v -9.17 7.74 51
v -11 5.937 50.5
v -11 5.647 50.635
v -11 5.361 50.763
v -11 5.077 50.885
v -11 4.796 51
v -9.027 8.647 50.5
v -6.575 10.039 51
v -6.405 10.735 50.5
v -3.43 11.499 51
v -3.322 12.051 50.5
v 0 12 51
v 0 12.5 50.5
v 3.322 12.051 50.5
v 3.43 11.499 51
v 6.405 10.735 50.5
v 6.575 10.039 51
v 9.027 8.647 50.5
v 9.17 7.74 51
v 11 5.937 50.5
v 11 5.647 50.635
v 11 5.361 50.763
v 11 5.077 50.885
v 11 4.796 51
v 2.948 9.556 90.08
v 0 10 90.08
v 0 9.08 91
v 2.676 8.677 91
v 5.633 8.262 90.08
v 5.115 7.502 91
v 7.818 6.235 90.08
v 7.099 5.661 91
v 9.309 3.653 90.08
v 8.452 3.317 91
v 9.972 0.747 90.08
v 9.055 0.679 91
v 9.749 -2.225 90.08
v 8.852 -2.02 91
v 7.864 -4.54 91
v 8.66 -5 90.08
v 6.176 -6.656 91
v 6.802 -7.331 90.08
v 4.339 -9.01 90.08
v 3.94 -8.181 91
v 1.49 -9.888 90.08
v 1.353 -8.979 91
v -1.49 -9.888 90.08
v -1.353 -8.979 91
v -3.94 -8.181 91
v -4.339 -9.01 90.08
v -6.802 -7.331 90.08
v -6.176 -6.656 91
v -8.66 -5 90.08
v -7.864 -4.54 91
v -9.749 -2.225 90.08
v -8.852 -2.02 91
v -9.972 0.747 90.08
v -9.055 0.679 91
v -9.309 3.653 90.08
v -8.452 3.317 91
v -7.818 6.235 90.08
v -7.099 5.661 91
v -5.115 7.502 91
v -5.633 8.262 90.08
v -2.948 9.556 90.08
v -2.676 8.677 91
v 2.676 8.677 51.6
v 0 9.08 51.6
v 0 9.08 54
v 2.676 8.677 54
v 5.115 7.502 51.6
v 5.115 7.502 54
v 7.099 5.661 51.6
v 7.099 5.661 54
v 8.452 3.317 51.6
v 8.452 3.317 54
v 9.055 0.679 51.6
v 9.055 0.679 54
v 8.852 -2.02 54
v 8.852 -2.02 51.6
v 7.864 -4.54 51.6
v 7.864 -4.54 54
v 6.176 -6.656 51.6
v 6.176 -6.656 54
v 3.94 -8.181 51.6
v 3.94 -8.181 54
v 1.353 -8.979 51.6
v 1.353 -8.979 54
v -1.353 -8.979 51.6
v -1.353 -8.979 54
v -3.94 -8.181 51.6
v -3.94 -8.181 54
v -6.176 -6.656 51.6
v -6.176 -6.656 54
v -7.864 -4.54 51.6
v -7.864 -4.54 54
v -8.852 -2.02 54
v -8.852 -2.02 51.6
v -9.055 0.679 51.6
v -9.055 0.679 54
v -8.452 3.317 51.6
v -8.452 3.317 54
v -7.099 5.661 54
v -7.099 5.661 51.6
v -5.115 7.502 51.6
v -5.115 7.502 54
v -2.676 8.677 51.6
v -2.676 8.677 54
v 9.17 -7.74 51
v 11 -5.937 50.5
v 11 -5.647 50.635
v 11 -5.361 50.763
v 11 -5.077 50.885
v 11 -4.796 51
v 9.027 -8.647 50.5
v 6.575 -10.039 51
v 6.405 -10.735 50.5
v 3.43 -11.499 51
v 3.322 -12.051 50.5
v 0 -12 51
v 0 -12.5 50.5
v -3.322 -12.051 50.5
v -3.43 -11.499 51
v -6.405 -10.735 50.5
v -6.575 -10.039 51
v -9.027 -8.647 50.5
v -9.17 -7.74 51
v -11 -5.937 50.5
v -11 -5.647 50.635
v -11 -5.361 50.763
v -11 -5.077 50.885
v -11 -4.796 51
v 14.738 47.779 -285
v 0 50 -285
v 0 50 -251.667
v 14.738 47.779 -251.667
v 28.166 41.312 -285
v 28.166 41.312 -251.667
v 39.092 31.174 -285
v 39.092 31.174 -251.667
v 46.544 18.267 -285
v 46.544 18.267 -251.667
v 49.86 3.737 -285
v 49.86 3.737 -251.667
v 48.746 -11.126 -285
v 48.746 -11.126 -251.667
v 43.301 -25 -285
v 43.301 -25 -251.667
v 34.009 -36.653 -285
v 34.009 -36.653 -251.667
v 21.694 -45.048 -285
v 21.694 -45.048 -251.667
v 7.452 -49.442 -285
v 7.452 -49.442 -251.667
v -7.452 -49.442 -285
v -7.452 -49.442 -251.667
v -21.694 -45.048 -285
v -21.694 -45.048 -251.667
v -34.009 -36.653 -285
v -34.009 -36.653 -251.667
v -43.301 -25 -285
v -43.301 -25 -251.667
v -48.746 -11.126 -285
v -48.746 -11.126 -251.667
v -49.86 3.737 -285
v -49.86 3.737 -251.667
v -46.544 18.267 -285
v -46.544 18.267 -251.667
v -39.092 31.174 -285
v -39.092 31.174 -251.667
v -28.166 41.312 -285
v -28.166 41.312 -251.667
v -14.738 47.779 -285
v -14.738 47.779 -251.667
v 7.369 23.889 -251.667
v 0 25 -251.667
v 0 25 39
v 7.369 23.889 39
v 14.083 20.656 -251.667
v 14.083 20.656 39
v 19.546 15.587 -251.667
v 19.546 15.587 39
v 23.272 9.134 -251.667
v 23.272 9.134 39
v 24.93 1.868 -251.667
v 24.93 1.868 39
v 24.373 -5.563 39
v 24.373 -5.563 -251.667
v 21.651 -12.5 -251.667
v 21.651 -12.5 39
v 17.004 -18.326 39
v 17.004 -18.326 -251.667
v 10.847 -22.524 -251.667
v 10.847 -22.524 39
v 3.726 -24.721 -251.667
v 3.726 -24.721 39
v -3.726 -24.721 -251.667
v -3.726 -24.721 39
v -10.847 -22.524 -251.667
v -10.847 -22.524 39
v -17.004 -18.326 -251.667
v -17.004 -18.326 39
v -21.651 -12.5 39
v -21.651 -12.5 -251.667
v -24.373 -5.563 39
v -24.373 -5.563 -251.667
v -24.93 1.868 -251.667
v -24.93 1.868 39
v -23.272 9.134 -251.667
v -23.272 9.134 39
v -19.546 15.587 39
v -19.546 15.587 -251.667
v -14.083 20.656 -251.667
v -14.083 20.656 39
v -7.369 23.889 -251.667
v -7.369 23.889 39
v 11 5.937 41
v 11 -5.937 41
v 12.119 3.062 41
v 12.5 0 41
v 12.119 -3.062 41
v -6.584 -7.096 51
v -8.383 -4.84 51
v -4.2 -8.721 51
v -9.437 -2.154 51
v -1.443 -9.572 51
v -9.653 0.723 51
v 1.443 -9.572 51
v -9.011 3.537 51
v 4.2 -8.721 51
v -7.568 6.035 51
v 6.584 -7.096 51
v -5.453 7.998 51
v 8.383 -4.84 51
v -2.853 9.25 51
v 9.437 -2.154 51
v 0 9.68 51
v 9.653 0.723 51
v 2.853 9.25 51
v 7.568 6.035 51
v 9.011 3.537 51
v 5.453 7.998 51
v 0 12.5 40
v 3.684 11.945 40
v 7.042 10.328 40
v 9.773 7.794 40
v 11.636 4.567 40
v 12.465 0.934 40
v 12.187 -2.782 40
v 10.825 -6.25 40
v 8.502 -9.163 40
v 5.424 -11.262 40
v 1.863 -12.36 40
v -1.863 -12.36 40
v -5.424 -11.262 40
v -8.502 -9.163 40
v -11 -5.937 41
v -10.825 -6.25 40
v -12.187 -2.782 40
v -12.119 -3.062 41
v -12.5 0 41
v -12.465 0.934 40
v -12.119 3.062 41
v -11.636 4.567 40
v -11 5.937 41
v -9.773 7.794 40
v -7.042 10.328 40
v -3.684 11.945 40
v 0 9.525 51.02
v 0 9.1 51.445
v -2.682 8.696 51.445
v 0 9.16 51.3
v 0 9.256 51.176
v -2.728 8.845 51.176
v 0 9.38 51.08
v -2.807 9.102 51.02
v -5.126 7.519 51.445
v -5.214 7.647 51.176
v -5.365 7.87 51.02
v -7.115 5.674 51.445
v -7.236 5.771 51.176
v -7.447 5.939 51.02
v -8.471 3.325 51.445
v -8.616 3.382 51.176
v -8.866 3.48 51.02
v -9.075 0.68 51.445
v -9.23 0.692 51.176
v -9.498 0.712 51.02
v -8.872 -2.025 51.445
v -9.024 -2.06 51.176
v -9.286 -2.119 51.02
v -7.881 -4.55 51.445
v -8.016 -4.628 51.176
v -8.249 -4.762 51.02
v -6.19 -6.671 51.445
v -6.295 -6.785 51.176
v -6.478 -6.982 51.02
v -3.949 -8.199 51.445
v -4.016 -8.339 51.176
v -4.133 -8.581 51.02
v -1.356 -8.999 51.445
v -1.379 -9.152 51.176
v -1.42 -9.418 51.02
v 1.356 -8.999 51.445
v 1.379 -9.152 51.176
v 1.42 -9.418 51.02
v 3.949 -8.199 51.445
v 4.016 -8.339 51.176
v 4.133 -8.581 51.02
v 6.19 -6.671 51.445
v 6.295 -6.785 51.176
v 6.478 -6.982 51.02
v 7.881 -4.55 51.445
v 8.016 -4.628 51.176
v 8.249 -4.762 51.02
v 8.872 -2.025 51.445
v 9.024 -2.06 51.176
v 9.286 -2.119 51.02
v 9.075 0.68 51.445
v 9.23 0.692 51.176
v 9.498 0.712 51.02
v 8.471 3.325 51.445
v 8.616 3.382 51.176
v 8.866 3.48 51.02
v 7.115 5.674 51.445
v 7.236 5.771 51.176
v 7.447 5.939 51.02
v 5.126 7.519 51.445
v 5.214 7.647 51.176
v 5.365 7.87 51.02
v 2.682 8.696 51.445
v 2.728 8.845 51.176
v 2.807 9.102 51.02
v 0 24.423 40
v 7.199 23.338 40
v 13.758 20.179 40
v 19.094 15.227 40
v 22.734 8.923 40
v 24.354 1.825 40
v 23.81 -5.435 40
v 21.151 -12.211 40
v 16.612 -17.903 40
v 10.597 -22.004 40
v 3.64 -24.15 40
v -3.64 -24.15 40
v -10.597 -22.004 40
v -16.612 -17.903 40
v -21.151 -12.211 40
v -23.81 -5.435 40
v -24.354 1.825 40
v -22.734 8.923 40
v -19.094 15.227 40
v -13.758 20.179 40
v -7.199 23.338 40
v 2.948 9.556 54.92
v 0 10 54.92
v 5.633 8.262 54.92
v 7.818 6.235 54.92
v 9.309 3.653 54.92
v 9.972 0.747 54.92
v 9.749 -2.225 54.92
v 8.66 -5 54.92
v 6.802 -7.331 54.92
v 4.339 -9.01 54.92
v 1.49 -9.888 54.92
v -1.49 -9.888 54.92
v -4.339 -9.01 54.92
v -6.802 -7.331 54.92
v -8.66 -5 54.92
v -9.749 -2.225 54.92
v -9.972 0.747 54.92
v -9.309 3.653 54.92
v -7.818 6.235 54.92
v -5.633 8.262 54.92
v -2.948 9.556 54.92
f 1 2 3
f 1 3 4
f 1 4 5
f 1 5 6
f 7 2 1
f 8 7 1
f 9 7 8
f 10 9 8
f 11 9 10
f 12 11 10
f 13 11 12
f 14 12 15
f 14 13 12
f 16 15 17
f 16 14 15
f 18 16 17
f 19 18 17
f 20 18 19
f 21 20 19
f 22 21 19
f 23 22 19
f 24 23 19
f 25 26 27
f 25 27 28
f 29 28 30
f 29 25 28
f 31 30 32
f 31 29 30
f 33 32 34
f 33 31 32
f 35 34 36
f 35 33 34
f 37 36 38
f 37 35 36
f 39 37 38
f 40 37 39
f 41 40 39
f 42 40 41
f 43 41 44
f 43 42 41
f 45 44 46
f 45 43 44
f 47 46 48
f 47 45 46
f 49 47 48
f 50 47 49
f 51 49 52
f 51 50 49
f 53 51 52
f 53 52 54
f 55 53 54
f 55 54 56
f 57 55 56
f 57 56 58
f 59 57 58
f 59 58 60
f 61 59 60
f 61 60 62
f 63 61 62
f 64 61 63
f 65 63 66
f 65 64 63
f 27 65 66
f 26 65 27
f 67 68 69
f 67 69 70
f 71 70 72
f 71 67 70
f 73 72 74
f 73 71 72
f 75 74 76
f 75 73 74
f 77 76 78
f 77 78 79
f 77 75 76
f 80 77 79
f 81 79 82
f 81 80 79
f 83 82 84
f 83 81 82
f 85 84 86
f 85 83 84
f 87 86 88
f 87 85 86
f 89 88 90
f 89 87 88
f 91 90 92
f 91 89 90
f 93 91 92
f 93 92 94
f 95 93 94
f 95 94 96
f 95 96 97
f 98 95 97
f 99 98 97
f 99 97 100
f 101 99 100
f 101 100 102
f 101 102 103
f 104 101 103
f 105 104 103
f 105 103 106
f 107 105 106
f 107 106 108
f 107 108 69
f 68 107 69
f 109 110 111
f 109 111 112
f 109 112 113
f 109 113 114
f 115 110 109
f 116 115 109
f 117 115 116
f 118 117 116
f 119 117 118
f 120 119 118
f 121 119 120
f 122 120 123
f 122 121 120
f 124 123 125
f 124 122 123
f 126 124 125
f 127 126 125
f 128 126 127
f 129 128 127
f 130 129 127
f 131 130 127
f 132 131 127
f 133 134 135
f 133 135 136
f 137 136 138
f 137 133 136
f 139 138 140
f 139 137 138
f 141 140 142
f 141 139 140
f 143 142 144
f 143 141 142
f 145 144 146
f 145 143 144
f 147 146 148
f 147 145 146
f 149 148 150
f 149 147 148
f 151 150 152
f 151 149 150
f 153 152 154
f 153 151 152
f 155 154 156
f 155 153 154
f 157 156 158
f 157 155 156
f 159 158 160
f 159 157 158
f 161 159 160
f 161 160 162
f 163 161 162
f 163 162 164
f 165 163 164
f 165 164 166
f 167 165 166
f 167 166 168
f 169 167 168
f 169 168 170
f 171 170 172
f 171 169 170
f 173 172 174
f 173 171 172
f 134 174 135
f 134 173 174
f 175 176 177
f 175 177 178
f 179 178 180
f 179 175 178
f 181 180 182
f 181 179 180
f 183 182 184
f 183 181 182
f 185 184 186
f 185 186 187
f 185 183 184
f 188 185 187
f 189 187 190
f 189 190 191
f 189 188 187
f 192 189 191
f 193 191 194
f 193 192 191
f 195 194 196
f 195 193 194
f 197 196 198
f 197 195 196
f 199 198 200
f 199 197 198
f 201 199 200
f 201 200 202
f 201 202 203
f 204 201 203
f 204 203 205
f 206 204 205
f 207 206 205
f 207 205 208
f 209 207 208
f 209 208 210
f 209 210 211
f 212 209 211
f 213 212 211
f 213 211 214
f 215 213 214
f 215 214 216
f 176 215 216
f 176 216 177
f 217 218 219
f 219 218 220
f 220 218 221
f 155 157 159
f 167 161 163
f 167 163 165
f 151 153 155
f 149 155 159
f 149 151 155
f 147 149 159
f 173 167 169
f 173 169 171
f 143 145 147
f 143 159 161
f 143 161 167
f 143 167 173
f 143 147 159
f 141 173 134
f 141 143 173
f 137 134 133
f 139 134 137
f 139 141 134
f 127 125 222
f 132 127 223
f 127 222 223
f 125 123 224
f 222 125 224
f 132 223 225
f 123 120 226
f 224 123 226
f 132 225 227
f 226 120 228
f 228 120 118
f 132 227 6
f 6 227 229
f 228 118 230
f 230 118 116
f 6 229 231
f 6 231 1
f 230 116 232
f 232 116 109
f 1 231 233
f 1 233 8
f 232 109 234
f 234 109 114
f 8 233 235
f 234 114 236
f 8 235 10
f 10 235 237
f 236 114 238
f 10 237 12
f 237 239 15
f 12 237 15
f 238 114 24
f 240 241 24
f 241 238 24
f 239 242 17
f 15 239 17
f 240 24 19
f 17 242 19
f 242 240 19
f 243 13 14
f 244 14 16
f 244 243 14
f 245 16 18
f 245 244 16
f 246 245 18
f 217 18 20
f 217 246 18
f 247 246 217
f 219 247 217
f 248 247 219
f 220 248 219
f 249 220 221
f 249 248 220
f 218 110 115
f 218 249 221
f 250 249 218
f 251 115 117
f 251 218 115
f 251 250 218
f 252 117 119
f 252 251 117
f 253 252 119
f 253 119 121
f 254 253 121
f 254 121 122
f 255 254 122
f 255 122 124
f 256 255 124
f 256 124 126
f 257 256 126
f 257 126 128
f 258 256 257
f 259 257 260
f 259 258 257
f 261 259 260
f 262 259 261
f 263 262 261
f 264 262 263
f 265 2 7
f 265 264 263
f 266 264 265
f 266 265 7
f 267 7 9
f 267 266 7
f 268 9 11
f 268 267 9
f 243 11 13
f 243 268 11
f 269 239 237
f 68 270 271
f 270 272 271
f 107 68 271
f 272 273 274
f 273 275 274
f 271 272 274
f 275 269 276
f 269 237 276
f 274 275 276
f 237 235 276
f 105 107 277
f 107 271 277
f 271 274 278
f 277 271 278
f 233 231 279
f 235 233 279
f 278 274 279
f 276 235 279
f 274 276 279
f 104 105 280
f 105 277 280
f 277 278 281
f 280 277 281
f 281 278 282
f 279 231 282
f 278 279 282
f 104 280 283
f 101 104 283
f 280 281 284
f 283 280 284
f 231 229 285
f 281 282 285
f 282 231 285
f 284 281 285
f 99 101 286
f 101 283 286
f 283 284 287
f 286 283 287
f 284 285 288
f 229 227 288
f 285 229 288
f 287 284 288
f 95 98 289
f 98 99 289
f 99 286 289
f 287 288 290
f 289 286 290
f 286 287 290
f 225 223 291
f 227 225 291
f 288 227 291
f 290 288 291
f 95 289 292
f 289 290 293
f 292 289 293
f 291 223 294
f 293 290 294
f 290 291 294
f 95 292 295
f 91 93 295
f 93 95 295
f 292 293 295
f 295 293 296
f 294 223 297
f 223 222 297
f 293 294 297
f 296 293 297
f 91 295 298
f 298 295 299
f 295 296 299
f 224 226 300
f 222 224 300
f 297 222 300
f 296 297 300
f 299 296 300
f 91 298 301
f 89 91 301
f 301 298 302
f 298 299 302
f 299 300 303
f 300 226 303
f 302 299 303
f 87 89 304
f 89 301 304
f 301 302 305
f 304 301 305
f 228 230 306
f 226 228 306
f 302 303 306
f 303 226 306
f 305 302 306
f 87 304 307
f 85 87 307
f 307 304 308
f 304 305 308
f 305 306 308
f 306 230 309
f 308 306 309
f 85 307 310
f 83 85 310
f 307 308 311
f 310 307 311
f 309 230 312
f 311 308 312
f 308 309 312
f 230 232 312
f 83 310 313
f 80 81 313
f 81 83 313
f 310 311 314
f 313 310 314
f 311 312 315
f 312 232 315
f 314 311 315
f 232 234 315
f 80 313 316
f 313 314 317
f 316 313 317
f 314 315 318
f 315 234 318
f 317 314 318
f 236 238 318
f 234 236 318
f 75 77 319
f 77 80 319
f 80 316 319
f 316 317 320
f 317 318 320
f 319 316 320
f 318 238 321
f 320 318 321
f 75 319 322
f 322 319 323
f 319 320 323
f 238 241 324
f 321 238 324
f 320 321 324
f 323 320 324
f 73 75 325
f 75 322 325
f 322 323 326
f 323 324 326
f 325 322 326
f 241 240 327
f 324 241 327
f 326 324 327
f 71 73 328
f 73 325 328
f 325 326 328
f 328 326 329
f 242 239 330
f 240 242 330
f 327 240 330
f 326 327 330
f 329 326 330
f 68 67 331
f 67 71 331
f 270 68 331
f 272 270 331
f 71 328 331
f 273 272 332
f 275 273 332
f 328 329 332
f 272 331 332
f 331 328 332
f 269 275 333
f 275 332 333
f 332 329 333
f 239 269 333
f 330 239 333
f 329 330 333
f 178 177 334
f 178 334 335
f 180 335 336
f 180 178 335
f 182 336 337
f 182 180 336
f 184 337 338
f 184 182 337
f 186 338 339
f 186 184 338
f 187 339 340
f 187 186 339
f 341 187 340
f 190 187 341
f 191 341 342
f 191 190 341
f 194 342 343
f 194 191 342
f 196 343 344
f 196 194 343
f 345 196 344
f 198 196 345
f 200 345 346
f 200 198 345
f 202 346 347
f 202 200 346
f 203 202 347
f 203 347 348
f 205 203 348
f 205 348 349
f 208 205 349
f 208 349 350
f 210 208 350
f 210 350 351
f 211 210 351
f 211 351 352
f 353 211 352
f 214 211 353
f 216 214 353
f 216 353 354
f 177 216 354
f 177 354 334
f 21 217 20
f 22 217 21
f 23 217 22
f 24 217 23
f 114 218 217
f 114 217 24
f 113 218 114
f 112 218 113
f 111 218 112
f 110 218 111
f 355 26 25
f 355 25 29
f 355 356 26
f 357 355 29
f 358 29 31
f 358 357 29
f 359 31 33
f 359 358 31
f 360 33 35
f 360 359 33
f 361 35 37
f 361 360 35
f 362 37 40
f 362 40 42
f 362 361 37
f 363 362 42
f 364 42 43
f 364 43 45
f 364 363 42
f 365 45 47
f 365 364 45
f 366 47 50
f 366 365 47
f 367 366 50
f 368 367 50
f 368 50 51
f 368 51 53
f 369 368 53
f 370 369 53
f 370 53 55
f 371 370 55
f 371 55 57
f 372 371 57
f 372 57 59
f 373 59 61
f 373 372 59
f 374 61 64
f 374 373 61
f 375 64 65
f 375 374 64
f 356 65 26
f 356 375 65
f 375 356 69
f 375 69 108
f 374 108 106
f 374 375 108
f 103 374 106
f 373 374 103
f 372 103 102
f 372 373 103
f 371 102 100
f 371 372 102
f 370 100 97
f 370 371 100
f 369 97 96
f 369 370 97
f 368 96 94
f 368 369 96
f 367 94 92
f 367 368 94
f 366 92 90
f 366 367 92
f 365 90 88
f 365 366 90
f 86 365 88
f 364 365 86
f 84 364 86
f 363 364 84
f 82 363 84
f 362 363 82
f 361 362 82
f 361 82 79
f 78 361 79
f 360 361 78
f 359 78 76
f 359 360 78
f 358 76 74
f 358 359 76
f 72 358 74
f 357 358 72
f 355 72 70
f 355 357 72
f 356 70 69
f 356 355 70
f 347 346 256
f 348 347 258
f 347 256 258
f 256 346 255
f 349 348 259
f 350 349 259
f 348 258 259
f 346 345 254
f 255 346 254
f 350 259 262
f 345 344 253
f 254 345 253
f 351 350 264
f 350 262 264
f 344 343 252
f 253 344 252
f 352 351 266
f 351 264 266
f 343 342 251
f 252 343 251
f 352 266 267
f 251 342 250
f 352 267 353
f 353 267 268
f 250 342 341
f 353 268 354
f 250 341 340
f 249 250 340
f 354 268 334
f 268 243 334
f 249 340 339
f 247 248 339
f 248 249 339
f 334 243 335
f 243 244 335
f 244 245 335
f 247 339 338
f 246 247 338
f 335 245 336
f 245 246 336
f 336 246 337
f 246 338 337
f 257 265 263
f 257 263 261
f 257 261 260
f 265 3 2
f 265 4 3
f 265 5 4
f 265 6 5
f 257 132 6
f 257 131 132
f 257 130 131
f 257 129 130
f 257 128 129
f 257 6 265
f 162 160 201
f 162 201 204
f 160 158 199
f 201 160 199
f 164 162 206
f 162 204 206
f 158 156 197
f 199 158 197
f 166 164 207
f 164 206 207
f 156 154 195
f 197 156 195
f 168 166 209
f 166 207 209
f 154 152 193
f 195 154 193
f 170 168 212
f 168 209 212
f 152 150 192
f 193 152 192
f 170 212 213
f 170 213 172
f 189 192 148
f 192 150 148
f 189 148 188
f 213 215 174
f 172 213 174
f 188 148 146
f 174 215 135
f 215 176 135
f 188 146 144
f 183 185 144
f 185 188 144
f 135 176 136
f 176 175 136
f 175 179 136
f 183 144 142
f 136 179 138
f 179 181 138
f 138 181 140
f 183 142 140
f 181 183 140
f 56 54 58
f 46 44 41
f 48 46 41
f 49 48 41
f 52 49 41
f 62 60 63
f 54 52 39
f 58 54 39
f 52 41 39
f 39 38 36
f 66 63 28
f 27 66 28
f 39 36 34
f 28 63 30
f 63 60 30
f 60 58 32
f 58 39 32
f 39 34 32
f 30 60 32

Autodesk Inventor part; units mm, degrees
sketch "Sketch_1" plane through (0, 0, 0) normal (1, 0, 0) x (0, 1, 0)
  line L0 (0, -285) -> (0, 51)
  line L1 (0, 51) -> (12, 51)
  line L2 (12, 51) -> (12.5, 50.5)
  line L3 (12.5, 50.5) -> (12.5, 40)
  line L4 (12.5, 40) -> (24.4226, 40)
  line L5 (24.4226, 40) -> (25, 39)
  line L6 (25, 39) -> (25, -251.6667)
  line L7 (25, -251.6667) -> (50, -251.6667)
  line L8 (50, -251.6667) -> (50, -285)
  line L9 (50, -285) -> (0, -285)
  line L10 (0, -285) -> (0, 51)
revolve "Revolution1" add sketch "Sketch_1" angle 360 about axis through (0, 0, -285) along (0, 0, -1)
sketch "Sketch_3" plane through (0, 0, 0) normal (0, 1, 0) x (-1, 0, 0)
  line L0 (14, 41) -> (14, 54)
  line L1 (14, 54) -> (-14, 54)
  line L2 (-14, 54) -> (-14, 41)
  line L3 (-14, 41) -> (-11, 41)
  line L4 (-11, 41) -> (-11, 51)
  line L5 (-11, 51) -> (11, 51)
  line L6 (11, 51) -> (11, 41)
  line L7 (11, 41) -> (14, 41)
extrude "Extrusion1" cut sketch "Sketch_3" along normal mid plane 50
sketch "Sketch_2" plane through (0, 0, 0) normal (1, 0, 0) x (0, 1, 0)
  line L0 (0, 51) -> (0, 91)
  line L1 (0, 91) -> (9.08, 91)
  line L2 (9.08, 91) -> (10, 90.08)
  line L3 (10, 90.08) -> (10, 54.92)
  line L4 (10, 54.92) -> (9.08, 54)
  line L5 (9.08, 54) -> (9.08, 51.6)
  arc A0 (9.08, 51.6) -> (9.68, 51) centre (9.68, 51.6) ccw
  line L6 (9.68, 51) -> (0, 51)
  line L7 (0, 51) -> (0, 91)
revolve "Revolution2" add sketch "Sketch_2" angle 360 about axis through (0, 0, 51) along (0, 0, -1)
thread "Thread1" size "M20x1.5" class "6g" standard "ISO Metric profile" full length
ref_plane "ANBAU_XY" through (0, 0, -285) normal (0, 0, -1) x (1, 0, 0)
ref_plane "ANBAU_YZ" through (0, 0, -285) normal (1, 0, 0) x (0, -1, 0)
ref_plane "ANBAU_ZX" through (0, 0, -285) normal (0, -1, 0) x (0, 0, -1)
ref_plane "NUT_XY" through (0, 0, 61) normal (0, 0, -1) x (1, 0, 0)
ref_plane "NUT_YZ" through (0, 0, 61) normal (1, 0, 0) x (0, -1, 0)
ref_plane "NUT_ZX" through (0, 0, 61) normal (0, -1, 0) x (0, 0, -1)
properties part number "ESBF-BS-100-100-20P---(KS_0)"
